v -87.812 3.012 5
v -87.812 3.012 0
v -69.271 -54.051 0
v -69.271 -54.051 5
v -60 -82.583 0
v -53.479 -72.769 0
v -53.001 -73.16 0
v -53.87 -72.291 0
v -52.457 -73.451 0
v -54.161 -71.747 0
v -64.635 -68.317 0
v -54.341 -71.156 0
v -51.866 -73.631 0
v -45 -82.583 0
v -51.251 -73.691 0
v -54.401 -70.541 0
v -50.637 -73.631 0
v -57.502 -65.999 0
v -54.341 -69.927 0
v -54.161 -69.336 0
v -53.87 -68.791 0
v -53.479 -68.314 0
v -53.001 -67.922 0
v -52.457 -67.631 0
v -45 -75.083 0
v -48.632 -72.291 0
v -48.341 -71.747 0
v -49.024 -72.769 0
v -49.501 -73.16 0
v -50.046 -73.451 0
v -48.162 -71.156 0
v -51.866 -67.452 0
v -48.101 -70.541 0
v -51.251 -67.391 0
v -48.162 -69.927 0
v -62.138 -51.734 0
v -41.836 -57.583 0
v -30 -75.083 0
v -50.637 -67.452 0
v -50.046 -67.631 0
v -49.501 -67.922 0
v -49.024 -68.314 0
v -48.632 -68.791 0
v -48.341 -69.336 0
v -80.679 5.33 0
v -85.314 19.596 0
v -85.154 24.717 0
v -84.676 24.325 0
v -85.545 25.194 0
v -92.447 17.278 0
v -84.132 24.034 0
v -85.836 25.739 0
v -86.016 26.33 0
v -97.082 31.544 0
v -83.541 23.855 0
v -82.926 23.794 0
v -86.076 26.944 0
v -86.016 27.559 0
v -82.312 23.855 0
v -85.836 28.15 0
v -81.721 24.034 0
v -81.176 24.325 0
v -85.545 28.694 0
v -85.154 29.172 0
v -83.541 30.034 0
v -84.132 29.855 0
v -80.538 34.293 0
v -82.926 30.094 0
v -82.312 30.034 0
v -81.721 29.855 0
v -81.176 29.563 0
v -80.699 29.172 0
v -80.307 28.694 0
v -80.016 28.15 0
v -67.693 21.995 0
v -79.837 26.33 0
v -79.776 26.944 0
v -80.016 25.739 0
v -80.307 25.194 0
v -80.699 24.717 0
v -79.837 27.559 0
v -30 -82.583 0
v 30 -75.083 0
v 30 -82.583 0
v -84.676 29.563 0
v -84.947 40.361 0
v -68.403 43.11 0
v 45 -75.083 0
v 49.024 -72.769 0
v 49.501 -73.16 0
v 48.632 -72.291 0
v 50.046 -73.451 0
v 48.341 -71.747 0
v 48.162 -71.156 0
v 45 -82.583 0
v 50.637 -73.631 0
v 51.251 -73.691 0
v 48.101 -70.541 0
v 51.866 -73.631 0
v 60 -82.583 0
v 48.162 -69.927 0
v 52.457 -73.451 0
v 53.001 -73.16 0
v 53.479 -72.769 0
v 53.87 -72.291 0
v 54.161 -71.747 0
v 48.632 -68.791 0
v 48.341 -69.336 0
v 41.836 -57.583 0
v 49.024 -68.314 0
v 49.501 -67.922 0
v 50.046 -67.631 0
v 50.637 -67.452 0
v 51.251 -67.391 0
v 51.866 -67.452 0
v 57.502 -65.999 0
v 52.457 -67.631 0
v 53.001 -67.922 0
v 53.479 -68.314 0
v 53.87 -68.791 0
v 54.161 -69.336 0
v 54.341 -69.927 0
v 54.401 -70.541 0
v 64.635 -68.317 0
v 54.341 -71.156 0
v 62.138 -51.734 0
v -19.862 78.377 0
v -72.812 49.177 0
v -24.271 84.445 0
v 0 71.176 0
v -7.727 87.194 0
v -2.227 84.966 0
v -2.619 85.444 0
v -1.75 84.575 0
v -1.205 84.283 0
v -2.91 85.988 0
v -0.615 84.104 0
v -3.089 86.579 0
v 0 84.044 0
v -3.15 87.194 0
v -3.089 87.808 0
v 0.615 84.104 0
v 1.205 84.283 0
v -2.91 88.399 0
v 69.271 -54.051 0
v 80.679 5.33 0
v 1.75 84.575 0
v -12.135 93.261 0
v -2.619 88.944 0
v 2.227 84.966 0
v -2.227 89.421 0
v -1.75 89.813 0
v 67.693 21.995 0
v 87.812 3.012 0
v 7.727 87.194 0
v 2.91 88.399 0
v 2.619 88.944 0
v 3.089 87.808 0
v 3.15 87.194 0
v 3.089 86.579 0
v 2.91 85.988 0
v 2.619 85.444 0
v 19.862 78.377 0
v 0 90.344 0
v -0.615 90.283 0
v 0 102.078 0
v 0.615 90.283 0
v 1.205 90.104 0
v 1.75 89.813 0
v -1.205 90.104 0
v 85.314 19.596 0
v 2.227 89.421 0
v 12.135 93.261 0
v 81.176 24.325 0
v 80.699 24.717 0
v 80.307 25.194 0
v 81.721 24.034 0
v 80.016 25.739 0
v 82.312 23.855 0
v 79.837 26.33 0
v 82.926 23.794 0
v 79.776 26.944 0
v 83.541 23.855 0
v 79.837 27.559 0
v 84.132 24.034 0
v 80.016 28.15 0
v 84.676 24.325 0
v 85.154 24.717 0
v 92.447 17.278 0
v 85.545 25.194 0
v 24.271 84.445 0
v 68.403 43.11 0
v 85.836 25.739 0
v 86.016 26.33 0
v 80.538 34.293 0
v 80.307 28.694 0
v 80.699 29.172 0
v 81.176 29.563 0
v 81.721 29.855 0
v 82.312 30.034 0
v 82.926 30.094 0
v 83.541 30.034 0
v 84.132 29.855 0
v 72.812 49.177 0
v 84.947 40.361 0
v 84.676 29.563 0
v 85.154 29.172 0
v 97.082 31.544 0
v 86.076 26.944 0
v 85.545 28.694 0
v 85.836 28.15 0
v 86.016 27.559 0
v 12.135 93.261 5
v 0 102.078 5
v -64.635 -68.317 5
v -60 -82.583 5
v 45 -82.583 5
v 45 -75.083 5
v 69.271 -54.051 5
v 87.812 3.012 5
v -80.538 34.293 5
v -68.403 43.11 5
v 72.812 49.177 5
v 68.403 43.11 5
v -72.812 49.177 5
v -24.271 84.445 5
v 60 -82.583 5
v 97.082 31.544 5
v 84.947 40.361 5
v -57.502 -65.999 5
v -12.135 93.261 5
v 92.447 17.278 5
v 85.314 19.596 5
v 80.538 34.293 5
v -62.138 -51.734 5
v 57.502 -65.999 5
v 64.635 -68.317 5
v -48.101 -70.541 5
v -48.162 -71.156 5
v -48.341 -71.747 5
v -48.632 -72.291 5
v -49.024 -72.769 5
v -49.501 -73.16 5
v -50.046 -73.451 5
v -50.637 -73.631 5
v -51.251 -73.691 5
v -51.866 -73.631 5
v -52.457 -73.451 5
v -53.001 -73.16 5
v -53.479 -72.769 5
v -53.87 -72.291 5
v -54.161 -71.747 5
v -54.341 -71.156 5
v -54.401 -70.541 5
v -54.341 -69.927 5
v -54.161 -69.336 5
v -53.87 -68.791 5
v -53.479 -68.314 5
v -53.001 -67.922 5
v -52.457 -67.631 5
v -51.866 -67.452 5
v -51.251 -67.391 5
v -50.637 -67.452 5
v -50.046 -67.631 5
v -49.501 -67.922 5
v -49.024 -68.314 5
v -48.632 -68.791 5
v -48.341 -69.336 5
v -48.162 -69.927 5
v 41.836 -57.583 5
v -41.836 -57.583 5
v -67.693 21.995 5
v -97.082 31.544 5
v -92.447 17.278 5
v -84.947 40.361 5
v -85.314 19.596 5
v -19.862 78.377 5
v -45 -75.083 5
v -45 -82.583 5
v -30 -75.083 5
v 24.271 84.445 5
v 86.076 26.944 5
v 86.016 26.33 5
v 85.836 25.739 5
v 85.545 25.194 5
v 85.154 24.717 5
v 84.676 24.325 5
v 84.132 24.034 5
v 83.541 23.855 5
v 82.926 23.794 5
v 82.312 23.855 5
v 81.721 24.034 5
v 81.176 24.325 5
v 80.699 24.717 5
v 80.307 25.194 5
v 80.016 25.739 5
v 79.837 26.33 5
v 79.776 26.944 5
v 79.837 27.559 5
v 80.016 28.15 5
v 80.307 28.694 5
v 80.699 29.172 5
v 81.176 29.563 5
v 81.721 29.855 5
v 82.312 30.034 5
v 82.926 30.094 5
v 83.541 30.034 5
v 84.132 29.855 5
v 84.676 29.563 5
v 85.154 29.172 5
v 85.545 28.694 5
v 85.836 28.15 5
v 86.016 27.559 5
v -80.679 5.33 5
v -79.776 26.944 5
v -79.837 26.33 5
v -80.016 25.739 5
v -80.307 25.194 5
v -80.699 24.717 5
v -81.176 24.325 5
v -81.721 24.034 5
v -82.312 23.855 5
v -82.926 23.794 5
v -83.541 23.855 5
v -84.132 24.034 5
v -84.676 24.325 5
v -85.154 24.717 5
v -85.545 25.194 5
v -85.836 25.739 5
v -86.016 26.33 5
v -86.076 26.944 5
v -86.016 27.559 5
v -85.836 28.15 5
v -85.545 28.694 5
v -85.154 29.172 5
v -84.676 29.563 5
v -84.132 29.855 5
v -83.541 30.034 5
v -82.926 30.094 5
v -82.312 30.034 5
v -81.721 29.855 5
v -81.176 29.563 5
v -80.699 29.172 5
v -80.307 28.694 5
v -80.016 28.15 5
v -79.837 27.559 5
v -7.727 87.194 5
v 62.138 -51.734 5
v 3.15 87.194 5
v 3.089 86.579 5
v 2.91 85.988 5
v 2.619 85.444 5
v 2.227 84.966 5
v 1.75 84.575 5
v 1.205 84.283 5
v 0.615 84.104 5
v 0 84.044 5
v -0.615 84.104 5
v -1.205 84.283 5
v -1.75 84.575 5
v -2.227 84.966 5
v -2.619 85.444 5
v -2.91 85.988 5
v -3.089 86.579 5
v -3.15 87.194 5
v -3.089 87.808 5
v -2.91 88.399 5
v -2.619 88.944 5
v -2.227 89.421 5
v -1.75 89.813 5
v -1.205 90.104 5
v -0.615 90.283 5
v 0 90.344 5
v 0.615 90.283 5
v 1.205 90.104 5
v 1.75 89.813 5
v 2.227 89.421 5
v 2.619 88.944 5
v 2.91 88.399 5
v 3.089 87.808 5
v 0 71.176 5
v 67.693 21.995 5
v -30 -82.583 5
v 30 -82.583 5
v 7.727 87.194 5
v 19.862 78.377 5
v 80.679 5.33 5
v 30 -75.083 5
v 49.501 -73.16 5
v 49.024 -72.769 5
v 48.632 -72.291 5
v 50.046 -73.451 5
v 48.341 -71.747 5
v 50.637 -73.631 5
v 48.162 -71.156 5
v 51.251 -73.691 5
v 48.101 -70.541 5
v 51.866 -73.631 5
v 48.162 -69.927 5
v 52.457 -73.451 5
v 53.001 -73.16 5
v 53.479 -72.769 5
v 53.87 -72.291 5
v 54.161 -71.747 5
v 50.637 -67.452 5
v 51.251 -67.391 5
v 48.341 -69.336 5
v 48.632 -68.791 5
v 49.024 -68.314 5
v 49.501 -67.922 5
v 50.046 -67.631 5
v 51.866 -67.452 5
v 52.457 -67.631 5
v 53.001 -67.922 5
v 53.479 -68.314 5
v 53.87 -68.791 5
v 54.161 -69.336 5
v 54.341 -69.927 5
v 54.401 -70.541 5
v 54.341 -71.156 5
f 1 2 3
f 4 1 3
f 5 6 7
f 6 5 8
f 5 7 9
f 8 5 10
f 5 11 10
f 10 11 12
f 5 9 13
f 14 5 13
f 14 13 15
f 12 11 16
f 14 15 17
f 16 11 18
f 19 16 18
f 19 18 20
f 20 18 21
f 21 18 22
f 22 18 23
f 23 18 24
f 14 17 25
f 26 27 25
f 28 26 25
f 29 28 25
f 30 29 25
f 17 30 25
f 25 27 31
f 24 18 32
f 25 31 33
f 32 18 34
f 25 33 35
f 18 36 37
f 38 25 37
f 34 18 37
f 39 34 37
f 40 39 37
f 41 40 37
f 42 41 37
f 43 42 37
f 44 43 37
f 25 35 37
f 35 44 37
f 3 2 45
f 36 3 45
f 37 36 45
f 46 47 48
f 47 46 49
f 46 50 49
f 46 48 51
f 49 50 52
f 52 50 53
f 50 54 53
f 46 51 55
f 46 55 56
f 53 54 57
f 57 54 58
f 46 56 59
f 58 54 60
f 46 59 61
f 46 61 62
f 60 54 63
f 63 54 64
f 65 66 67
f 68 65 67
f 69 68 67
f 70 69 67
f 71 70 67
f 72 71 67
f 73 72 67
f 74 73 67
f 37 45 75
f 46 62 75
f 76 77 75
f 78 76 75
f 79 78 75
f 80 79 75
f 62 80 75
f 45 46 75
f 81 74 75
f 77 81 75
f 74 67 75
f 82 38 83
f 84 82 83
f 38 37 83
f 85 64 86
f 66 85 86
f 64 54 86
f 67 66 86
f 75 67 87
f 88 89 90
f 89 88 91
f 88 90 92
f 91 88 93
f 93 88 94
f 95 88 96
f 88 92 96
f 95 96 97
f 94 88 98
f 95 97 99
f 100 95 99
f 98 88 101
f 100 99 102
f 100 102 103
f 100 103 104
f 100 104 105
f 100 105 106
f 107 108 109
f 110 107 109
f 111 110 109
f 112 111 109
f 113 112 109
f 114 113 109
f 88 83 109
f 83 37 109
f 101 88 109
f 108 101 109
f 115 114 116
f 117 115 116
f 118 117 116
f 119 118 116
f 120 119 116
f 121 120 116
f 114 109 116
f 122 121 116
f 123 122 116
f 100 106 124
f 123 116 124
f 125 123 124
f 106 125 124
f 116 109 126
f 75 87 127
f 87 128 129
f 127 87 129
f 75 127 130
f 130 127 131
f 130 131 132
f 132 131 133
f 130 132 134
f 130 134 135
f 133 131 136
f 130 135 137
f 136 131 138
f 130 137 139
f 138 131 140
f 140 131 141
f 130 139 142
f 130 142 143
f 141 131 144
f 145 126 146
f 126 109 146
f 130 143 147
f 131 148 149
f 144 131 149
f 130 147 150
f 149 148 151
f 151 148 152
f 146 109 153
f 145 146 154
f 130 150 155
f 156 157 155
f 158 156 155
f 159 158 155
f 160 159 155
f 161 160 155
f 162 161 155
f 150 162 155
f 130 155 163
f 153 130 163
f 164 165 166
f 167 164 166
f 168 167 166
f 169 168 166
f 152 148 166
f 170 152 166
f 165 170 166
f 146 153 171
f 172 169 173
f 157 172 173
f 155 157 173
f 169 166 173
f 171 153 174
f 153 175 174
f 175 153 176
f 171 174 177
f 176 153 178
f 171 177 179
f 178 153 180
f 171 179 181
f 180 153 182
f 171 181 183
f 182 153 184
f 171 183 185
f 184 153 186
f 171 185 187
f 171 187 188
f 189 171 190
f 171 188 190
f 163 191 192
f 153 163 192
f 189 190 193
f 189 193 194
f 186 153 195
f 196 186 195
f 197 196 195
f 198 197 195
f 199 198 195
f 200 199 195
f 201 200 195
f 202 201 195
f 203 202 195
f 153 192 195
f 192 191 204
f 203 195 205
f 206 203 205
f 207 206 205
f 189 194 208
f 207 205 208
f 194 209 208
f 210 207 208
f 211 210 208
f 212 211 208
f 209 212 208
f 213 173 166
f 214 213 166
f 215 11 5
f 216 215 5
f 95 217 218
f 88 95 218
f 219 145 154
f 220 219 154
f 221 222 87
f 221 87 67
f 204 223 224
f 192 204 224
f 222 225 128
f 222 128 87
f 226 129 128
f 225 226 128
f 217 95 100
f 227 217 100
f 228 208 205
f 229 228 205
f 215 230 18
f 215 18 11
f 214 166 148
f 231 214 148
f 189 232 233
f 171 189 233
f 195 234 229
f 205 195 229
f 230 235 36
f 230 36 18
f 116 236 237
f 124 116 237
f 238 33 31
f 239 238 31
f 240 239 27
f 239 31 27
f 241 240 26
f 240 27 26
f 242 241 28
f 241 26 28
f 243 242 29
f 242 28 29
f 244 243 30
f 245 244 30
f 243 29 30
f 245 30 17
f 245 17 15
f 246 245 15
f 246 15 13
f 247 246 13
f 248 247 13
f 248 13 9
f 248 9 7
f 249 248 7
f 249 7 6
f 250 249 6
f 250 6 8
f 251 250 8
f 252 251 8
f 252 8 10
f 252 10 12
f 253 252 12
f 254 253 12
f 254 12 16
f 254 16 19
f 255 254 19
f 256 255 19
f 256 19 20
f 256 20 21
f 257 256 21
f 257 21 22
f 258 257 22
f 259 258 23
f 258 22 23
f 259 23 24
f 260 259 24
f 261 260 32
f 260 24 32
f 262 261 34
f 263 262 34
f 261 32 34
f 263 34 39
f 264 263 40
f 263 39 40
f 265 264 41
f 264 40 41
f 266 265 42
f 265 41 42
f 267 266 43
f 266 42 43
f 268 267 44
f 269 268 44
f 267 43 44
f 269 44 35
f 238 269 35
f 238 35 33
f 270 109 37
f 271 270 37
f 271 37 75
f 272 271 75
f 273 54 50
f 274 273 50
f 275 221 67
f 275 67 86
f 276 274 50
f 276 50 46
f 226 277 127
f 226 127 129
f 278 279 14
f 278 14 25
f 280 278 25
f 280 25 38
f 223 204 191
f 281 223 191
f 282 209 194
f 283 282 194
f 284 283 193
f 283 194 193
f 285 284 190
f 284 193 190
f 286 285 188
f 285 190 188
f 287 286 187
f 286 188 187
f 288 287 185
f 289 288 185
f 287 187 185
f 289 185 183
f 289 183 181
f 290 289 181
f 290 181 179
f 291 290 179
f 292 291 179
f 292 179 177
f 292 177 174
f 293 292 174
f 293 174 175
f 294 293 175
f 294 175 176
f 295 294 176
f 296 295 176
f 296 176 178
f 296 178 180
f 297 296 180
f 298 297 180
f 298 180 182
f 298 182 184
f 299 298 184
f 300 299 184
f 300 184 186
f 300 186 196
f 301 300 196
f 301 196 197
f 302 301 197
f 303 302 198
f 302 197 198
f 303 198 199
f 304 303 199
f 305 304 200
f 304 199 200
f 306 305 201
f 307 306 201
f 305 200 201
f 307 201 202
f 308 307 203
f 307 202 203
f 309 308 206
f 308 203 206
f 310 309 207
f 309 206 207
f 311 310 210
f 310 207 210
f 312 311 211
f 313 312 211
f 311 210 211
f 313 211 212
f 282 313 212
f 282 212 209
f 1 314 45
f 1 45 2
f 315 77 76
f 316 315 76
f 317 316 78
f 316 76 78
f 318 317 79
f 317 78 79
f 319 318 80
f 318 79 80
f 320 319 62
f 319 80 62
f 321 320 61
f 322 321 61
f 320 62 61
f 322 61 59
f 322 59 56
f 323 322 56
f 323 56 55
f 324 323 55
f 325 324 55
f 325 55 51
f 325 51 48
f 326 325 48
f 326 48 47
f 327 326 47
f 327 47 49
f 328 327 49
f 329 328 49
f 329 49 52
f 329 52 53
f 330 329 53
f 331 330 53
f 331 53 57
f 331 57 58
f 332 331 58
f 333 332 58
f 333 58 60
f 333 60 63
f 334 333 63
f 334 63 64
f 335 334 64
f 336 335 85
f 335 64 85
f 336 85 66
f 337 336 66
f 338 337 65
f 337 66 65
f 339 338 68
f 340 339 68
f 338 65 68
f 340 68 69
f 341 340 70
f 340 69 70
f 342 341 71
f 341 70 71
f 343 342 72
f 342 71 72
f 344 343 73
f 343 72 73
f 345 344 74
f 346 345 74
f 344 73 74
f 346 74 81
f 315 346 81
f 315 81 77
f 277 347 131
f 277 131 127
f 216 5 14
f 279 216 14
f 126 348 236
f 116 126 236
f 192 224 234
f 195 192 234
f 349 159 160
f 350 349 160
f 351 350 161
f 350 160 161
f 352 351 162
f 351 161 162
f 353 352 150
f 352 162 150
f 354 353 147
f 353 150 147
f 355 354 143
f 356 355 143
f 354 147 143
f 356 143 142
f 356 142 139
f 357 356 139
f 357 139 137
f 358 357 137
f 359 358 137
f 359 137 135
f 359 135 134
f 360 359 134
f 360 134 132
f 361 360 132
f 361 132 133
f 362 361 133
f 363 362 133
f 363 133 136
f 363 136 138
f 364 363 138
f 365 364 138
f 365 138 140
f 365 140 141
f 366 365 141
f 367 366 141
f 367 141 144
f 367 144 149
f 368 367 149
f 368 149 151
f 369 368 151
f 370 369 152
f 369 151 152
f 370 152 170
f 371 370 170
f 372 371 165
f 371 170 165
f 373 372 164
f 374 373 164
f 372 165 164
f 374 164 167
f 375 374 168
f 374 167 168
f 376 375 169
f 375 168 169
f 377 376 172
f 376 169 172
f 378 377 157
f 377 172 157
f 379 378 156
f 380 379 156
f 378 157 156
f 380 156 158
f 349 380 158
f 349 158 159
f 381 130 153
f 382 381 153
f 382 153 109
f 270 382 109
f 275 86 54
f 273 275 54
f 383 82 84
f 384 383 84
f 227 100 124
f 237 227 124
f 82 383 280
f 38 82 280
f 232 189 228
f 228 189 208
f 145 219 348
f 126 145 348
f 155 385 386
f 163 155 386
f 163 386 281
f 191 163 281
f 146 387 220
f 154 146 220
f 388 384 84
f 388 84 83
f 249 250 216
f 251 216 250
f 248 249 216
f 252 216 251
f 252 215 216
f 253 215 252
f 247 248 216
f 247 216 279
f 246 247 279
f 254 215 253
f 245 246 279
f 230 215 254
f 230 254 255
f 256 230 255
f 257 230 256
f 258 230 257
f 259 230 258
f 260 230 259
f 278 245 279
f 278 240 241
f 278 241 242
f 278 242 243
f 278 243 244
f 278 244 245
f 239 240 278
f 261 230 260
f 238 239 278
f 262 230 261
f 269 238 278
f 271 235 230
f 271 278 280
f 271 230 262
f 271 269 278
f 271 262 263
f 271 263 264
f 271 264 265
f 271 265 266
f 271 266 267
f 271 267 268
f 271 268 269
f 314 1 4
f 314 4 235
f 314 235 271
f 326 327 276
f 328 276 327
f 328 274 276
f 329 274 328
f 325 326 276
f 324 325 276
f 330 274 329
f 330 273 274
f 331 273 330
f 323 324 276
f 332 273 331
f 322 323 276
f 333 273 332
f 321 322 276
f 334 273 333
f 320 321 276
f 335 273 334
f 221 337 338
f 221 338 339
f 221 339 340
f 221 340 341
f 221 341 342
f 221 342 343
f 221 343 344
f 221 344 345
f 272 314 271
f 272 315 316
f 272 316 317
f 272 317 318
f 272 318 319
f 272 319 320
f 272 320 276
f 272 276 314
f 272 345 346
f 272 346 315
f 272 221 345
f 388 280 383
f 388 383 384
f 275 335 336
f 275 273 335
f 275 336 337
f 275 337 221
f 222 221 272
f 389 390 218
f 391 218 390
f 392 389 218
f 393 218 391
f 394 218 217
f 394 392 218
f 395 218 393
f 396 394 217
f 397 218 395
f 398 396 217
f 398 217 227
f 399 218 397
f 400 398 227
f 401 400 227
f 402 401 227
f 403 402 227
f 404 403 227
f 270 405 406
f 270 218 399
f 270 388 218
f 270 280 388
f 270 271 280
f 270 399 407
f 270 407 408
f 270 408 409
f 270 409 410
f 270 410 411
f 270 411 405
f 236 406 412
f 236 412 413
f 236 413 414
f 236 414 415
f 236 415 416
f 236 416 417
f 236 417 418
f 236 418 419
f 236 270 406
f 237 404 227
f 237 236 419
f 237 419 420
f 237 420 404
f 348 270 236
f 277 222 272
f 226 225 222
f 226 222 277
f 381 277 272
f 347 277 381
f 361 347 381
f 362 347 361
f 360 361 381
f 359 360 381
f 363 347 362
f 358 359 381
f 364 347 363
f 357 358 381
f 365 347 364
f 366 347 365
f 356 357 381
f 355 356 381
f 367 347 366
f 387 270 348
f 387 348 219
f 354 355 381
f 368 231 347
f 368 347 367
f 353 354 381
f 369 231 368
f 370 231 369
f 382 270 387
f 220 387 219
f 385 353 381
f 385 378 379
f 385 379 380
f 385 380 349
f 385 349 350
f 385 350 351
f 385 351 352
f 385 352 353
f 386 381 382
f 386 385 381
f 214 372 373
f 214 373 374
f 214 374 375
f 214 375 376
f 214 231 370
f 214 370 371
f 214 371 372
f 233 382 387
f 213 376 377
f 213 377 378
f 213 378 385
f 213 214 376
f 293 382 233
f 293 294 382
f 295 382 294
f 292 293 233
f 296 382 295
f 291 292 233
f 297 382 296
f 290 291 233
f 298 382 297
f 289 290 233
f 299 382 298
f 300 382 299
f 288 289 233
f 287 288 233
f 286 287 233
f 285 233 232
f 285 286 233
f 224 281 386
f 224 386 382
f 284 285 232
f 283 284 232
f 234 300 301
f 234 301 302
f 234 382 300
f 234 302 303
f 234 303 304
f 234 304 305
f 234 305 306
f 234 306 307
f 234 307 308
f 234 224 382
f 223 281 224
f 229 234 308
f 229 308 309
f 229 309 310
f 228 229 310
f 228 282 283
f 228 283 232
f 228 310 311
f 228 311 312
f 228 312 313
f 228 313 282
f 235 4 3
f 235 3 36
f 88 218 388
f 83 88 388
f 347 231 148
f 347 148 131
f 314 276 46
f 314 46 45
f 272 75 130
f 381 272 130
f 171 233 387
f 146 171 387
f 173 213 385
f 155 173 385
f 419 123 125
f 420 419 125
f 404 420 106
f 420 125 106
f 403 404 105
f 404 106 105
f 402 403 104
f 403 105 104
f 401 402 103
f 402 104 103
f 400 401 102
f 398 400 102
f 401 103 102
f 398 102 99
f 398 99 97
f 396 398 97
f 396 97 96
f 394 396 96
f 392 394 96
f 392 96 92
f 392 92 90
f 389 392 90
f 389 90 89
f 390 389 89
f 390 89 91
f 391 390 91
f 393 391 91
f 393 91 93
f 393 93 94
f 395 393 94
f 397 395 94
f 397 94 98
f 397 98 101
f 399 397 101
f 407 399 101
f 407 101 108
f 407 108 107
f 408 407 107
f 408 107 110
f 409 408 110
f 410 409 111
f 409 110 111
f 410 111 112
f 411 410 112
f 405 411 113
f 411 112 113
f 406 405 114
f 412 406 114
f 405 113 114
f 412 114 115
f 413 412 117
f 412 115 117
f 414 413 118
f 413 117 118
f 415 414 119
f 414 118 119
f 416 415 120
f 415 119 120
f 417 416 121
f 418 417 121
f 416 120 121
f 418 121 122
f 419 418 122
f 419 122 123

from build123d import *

# Parameters (mm, degrees)
PAD_DEPTH       = 5
SKETCH001_W     = 15
SKETCH001_H     = 7.5
POCKET_DEPTH    = 541.0024137145
SKETCH004_R     = 3.15
POCKET002_DEPTH = 5.001
POCKET003_DEPTH = 5.001


with BuildPart() as part:
    # Sketch → Pad (new body)
    with BuildSketch(Plane.XY):
        Polygon((0, 102.0780970022), (-97.082039325, 31.5438667271), (-60, -82.5829152283), (60, -82.5829152283), (97.082039325, 31.5438667271), align=None)
    extrude(amount=PAD_DEPTH)

    # Sketch001 → Pocket (cut, through all)
    with BuildSketch(Plane.XY.offset(5)):
        Polygon((-84.9467844094, 40.3606455115), (-72.8115294937, 49.1774242959), (-68.4031401016, 43.1097968381), (-80.5383950172, 34.2930180537), align=None)
        Polygon((-12.1352549156, 93.2613182179), (-7.7268655234, 87.19369076), (-19.8621204391, 78.3769119757), (-24.2705111804, 84.4445384533), align=None)
        Polygon((-92.4467844094, 17.2780189827), (-85.3138605372, 19.5956464405), (-80.6786056215, 5.3297986961), (-87.8115294937, 3.0121712383), align=None)
        Polygon((-69.2705098312, -54.0512197394), (-62.137585959, -51.7335922816), (-57.5023310434, -65.999440026), (-64.6352549156, -68.3170674838), align=None)
        with Locations((-37.5, -78.8329152283)):
            Rectangle(SKETCH001_W, SKETCH001_H)
    pocket = extrude(amount=-POCKET_DEPTH, mode=Mode.SUBTRACT)

    # Mirrored: Pocket across Sketch001 V_Axis
    add(pocket.mirror(Plane(origin=(0, 0, 5), x_dir=(0, 0, 1), z_dir=(1, 0, 0))), mode=Mode.SUBTRACT)

    # Sketch004 → Pocket002 (cut, through all)
    with BuildSketch(Plane(origin=(0, 0, 0), x_dir=(1, 0, 0), z_dir=(0, 0, -1))):
        with Locations((-51.2511655217, 70.5411776272)):
            Circle(SKETCH004_R)
        with Locations((-82.9261277772, -26.9443322471)):
            Circle(SKETCH004_R)
        with Locations((0, -87.19369076)):
            Circle(SKETCH004_R)
        with Locations((82.9261277772, -26.9443322471)):
            Circle(SKETCH004_R)
        with Locations((51.2511655217, 70.5411776272)):
            Circle(SKETCH004_R)
    extrude(amount=-POCKET002_DEPTH, mode=Mode.SUBTRACT)

    # Sketch005 → Pocket003 (cut, through all)
    with BuildSketch(Plane(origin=(0, 0, 0), x_dir=(1, 0, 0), z_dir=(0, 0, -1))):
        Polygon((0, -71.1763975648), (67.6927767104, -21.9947164459), (41.8364367999, 57.5829152283), (-41.8364367999, 57.5829152283), (-67.6927767104, -21.9947164459), align=None)
    extrude(amount=-POCKET003_DEPTH, mode=Mode.SUBTRACT)


solid = part.part
